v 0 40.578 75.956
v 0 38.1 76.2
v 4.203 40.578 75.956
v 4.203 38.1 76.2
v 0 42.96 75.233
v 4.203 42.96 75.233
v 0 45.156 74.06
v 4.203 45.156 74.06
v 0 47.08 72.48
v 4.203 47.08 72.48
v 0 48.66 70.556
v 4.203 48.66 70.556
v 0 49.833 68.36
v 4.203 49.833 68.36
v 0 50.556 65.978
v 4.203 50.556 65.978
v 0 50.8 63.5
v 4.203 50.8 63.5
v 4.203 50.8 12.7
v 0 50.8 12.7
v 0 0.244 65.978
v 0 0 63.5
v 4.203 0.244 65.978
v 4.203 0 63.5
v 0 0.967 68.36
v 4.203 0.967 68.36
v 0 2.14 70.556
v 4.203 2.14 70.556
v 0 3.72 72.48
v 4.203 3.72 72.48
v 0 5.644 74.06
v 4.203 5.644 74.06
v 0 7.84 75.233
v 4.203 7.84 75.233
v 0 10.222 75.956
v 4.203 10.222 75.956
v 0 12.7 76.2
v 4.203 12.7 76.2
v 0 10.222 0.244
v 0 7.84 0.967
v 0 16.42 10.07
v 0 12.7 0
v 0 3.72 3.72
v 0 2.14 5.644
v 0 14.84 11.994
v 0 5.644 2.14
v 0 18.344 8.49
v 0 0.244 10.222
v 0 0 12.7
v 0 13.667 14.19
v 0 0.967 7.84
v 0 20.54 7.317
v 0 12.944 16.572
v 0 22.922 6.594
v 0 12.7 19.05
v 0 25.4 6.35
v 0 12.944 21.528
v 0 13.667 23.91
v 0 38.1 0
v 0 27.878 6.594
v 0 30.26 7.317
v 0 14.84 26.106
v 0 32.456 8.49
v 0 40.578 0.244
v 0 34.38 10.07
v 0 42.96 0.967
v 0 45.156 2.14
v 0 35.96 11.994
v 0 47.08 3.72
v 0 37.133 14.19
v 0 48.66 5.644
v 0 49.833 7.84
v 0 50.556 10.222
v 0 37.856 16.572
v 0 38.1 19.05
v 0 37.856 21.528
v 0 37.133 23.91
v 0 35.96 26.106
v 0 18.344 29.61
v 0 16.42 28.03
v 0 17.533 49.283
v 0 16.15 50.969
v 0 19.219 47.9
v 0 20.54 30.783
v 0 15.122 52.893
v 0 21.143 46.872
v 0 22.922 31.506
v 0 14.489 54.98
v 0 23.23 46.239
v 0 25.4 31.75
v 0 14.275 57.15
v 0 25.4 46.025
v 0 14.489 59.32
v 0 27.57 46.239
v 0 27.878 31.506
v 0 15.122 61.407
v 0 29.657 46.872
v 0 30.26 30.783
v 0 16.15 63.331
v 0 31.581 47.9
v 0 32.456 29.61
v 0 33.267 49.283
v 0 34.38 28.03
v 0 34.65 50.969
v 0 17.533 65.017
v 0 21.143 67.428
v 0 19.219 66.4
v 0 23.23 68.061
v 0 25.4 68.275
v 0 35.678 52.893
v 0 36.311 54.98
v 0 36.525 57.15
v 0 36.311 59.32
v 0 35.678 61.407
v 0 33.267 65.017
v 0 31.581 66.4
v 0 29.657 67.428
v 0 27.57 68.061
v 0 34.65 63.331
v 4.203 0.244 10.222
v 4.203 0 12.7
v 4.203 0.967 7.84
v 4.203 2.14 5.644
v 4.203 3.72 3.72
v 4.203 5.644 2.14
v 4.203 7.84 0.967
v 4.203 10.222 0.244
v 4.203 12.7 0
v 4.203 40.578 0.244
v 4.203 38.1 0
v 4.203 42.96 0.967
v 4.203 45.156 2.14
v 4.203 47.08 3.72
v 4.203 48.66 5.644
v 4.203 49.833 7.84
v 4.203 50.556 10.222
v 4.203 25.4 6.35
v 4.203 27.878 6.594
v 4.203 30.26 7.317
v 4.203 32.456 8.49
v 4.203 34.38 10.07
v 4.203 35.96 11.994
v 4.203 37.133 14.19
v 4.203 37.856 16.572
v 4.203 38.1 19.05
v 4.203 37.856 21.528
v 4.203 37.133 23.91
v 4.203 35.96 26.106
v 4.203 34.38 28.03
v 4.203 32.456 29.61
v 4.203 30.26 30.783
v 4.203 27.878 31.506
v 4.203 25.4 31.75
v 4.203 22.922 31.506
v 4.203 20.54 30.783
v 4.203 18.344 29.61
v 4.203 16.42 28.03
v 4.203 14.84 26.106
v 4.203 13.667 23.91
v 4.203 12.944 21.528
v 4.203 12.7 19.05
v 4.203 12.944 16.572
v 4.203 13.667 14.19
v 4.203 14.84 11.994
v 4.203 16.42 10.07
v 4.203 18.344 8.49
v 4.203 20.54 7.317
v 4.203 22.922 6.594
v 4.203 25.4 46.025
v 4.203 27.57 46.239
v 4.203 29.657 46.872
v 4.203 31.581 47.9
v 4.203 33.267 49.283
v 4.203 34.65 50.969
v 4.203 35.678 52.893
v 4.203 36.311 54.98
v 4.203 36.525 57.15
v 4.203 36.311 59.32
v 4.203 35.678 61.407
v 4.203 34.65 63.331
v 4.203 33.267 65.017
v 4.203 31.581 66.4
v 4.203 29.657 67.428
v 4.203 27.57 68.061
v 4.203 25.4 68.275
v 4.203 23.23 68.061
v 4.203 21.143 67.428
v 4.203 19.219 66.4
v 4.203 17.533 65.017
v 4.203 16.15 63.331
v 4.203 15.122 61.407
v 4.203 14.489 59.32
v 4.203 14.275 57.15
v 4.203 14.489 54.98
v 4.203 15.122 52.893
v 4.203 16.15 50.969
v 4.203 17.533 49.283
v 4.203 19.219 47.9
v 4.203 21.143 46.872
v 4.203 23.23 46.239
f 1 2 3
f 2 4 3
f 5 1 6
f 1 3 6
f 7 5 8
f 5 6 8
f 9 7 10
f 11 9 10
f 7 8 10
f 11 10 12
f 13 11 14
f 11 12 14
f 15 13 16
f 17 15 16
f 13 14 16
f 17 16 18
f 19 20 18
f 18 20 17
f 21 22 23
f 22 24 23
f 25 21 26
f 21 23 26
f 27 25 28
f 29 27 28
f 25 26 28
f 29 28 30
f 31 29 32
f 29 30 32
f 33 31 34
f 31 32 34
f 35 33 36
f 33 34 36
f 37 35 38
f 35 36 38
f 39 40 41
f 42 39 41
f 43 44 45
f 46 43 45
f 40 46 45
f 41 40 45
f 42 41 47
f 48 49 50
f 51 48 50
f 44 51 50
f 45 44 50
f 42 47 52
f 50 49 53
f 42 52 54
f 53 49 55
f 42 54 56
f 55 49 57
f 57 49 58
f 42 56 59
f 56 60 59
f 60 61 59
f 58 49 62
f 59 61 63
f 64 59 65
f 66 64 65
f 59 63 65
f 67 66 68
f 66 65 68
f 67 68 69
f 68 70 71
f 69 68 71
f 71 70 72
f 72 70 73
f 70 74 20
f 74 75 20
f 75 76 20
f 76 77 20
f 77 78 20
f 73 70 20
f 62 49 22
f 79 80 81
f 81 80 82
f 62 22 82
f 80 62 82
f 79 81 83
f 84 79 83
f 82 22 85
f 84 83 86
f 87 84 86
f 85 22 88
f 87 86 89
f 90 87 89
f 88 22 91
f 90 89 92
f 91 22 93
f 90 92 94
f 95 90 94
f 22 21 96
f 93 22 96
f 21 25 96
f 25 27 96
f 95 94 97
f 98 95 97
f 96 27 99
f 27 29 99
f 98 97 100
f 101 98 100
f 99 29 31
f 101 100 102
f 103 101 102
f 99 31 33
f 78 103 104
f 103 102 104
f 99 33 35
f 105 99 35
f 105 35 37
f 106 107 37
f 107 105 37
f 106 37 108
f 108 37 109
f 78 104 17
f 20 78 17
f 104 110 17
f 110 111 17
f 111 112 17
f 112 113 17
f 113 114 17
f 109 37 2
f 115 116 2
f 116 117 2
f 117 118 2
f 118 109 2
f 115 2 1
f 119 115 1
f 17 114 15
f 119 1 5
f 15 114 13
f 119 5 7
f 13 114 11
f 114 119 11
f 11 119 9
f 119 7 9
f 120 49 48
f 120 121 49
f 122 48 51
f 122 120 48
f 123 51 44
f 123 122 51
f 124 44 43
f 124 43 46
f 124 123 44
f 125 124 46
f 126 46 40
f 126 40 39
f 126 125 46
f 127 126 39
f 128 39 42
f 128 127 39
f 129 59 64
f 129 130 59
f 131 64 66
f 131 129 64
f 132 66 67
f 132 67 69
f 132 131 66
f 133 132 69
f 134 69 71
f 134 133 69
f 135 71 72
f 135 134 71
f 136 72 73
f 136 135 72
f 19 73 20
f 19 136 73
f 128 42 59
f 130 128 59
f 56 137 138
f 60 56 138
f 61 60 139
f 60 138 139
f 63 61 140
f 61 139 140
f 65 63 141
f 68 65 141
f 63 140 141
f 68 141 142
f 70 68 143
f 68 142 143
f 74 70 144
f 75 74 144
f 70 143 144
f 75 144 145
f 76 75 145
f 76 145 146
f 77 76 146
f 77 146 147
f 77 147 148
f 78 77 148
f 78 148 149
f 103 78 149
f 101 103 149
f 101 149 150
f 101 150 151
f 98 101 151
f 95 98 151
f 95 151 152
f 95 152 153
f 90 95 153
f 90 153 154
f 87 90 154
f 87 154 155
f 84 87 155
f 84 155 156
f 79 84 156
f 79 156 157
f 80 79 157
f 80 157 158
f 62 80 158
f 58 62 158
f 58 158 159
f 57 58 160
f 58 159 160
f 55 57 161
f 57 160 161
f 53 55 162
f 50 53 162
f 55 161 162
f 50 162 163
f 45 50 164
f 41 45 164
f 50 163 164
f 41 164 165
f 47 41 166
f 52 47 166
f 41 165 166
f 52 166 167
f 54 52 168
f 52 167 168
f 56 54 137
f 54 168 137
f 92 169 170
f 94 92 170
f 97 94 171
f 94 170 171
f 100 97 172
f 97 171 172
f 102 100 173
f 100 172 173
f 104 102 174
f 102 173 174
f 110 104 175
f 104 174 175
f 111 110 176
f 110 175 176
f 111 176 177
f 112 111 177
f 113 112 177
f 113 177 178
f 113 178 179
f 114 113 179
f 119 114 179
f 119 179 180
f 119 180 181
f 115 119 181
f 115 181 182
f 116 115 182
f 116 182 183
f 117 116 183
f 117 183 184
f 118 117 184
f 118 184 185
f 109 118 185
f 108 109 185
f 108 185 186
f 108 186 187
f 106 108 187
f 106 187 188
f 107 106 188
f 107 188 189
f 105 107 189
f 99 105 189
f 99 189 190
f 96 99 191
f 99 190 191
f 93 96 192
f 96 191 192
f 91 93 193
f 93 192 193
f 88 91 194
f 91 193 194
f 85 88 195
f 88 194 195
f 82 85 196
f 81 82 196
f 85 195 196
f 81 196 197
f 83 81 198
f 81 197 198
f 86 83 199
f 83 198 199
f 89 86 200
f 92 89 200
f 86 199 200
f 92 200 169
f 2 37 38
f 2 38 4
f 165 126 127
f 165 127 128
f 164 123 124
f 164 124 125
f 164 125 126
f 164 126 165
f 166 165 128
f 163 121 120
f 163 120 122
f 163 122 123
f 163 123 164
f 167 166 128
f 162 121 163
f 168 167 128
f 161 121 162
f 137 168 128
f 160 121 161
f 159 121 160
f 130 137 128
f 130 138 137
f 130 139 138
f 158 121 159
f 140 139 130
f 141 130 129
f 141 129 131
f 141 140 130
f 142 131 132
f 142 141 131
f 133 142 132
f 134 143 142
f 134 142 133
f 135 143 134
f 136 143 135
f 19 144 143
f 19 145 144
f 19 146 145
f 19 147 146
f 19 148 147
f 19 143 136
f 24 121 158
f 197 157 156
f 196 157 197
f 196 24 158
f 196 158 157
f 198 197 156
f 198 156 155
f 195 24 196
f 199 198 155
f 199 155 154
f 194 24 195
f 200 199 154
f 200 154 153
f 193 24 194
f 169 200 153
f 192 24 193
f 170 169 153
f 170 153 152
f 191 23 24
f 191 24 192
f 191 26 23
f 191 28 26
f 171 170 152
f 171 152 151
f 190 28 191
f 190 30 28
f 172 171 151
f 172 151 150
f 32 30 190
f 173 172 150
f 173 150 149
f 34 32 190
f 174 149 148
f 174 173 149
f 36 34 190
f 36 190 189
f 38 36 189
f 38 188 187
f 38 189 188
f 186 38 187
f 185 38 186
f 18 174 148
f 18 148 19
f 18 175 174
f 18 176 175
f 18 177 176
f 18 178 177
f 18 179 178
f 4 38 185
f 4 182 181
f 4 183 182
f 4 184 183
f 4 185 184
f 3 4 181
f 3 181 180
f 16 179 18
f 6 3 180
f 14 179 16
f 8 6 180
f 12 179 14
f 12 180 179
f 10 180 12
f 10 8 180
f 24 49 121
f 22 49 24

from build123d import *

# Parameters (mm, degrees)
SKETCH1_W           = 50.8
SKETCH1_H           = 76.2
BOSS_EXTRUDE1_DEPTH = 4.203048037
SKETCH3_R           = 11.1252
SKETCH3_R_2         = 12.7
CUT_EXTRUDE1_DEPTH  = 92.677399684
FILLET2_R           = 12.7


with BuildPart() as part:
    # Sketch1 → Boss-Extrude1 (new body)
    with BuildSketch(Plane.YZ):
        with Locations((25.4, 38.1)):
            Rectangle(SKETCH1_W, SKETCH1_H)
    extrude(amount=BOSS_EXTRUDE1_DEPTH)

    # Sketch3 → Cut-Extrude1 (cut, through all)
    with BuildSketch(Plane.YZ.offset(4.203048037)):
        with Locations(Location((25.4, 57.15, 0), (0, 0, 270))):
            Circle(SKETCH3_R)
        with Locations(Location((25.4, 19.05, 0), (0, 0, 270))):
            Circle(SKETCH3_R_2)
    extrude(amount=-CUT_EXTRUDE1_DEPTH, mode=Mode.SUBTRACT)

    # Fillet2
    fillet2_edges = [part.edges().sort_by_distance(p)[0] for p in [
        (2.101524019, 0, 0),
        (2.101524019, 0, 76.2),
        (2.101524019, 50.8, 76.2),
        (2.101524019, 50.8, 0),
    ]]
    fillet(fillet2_edges, radius=FILLET2_R)


solid = part.part
